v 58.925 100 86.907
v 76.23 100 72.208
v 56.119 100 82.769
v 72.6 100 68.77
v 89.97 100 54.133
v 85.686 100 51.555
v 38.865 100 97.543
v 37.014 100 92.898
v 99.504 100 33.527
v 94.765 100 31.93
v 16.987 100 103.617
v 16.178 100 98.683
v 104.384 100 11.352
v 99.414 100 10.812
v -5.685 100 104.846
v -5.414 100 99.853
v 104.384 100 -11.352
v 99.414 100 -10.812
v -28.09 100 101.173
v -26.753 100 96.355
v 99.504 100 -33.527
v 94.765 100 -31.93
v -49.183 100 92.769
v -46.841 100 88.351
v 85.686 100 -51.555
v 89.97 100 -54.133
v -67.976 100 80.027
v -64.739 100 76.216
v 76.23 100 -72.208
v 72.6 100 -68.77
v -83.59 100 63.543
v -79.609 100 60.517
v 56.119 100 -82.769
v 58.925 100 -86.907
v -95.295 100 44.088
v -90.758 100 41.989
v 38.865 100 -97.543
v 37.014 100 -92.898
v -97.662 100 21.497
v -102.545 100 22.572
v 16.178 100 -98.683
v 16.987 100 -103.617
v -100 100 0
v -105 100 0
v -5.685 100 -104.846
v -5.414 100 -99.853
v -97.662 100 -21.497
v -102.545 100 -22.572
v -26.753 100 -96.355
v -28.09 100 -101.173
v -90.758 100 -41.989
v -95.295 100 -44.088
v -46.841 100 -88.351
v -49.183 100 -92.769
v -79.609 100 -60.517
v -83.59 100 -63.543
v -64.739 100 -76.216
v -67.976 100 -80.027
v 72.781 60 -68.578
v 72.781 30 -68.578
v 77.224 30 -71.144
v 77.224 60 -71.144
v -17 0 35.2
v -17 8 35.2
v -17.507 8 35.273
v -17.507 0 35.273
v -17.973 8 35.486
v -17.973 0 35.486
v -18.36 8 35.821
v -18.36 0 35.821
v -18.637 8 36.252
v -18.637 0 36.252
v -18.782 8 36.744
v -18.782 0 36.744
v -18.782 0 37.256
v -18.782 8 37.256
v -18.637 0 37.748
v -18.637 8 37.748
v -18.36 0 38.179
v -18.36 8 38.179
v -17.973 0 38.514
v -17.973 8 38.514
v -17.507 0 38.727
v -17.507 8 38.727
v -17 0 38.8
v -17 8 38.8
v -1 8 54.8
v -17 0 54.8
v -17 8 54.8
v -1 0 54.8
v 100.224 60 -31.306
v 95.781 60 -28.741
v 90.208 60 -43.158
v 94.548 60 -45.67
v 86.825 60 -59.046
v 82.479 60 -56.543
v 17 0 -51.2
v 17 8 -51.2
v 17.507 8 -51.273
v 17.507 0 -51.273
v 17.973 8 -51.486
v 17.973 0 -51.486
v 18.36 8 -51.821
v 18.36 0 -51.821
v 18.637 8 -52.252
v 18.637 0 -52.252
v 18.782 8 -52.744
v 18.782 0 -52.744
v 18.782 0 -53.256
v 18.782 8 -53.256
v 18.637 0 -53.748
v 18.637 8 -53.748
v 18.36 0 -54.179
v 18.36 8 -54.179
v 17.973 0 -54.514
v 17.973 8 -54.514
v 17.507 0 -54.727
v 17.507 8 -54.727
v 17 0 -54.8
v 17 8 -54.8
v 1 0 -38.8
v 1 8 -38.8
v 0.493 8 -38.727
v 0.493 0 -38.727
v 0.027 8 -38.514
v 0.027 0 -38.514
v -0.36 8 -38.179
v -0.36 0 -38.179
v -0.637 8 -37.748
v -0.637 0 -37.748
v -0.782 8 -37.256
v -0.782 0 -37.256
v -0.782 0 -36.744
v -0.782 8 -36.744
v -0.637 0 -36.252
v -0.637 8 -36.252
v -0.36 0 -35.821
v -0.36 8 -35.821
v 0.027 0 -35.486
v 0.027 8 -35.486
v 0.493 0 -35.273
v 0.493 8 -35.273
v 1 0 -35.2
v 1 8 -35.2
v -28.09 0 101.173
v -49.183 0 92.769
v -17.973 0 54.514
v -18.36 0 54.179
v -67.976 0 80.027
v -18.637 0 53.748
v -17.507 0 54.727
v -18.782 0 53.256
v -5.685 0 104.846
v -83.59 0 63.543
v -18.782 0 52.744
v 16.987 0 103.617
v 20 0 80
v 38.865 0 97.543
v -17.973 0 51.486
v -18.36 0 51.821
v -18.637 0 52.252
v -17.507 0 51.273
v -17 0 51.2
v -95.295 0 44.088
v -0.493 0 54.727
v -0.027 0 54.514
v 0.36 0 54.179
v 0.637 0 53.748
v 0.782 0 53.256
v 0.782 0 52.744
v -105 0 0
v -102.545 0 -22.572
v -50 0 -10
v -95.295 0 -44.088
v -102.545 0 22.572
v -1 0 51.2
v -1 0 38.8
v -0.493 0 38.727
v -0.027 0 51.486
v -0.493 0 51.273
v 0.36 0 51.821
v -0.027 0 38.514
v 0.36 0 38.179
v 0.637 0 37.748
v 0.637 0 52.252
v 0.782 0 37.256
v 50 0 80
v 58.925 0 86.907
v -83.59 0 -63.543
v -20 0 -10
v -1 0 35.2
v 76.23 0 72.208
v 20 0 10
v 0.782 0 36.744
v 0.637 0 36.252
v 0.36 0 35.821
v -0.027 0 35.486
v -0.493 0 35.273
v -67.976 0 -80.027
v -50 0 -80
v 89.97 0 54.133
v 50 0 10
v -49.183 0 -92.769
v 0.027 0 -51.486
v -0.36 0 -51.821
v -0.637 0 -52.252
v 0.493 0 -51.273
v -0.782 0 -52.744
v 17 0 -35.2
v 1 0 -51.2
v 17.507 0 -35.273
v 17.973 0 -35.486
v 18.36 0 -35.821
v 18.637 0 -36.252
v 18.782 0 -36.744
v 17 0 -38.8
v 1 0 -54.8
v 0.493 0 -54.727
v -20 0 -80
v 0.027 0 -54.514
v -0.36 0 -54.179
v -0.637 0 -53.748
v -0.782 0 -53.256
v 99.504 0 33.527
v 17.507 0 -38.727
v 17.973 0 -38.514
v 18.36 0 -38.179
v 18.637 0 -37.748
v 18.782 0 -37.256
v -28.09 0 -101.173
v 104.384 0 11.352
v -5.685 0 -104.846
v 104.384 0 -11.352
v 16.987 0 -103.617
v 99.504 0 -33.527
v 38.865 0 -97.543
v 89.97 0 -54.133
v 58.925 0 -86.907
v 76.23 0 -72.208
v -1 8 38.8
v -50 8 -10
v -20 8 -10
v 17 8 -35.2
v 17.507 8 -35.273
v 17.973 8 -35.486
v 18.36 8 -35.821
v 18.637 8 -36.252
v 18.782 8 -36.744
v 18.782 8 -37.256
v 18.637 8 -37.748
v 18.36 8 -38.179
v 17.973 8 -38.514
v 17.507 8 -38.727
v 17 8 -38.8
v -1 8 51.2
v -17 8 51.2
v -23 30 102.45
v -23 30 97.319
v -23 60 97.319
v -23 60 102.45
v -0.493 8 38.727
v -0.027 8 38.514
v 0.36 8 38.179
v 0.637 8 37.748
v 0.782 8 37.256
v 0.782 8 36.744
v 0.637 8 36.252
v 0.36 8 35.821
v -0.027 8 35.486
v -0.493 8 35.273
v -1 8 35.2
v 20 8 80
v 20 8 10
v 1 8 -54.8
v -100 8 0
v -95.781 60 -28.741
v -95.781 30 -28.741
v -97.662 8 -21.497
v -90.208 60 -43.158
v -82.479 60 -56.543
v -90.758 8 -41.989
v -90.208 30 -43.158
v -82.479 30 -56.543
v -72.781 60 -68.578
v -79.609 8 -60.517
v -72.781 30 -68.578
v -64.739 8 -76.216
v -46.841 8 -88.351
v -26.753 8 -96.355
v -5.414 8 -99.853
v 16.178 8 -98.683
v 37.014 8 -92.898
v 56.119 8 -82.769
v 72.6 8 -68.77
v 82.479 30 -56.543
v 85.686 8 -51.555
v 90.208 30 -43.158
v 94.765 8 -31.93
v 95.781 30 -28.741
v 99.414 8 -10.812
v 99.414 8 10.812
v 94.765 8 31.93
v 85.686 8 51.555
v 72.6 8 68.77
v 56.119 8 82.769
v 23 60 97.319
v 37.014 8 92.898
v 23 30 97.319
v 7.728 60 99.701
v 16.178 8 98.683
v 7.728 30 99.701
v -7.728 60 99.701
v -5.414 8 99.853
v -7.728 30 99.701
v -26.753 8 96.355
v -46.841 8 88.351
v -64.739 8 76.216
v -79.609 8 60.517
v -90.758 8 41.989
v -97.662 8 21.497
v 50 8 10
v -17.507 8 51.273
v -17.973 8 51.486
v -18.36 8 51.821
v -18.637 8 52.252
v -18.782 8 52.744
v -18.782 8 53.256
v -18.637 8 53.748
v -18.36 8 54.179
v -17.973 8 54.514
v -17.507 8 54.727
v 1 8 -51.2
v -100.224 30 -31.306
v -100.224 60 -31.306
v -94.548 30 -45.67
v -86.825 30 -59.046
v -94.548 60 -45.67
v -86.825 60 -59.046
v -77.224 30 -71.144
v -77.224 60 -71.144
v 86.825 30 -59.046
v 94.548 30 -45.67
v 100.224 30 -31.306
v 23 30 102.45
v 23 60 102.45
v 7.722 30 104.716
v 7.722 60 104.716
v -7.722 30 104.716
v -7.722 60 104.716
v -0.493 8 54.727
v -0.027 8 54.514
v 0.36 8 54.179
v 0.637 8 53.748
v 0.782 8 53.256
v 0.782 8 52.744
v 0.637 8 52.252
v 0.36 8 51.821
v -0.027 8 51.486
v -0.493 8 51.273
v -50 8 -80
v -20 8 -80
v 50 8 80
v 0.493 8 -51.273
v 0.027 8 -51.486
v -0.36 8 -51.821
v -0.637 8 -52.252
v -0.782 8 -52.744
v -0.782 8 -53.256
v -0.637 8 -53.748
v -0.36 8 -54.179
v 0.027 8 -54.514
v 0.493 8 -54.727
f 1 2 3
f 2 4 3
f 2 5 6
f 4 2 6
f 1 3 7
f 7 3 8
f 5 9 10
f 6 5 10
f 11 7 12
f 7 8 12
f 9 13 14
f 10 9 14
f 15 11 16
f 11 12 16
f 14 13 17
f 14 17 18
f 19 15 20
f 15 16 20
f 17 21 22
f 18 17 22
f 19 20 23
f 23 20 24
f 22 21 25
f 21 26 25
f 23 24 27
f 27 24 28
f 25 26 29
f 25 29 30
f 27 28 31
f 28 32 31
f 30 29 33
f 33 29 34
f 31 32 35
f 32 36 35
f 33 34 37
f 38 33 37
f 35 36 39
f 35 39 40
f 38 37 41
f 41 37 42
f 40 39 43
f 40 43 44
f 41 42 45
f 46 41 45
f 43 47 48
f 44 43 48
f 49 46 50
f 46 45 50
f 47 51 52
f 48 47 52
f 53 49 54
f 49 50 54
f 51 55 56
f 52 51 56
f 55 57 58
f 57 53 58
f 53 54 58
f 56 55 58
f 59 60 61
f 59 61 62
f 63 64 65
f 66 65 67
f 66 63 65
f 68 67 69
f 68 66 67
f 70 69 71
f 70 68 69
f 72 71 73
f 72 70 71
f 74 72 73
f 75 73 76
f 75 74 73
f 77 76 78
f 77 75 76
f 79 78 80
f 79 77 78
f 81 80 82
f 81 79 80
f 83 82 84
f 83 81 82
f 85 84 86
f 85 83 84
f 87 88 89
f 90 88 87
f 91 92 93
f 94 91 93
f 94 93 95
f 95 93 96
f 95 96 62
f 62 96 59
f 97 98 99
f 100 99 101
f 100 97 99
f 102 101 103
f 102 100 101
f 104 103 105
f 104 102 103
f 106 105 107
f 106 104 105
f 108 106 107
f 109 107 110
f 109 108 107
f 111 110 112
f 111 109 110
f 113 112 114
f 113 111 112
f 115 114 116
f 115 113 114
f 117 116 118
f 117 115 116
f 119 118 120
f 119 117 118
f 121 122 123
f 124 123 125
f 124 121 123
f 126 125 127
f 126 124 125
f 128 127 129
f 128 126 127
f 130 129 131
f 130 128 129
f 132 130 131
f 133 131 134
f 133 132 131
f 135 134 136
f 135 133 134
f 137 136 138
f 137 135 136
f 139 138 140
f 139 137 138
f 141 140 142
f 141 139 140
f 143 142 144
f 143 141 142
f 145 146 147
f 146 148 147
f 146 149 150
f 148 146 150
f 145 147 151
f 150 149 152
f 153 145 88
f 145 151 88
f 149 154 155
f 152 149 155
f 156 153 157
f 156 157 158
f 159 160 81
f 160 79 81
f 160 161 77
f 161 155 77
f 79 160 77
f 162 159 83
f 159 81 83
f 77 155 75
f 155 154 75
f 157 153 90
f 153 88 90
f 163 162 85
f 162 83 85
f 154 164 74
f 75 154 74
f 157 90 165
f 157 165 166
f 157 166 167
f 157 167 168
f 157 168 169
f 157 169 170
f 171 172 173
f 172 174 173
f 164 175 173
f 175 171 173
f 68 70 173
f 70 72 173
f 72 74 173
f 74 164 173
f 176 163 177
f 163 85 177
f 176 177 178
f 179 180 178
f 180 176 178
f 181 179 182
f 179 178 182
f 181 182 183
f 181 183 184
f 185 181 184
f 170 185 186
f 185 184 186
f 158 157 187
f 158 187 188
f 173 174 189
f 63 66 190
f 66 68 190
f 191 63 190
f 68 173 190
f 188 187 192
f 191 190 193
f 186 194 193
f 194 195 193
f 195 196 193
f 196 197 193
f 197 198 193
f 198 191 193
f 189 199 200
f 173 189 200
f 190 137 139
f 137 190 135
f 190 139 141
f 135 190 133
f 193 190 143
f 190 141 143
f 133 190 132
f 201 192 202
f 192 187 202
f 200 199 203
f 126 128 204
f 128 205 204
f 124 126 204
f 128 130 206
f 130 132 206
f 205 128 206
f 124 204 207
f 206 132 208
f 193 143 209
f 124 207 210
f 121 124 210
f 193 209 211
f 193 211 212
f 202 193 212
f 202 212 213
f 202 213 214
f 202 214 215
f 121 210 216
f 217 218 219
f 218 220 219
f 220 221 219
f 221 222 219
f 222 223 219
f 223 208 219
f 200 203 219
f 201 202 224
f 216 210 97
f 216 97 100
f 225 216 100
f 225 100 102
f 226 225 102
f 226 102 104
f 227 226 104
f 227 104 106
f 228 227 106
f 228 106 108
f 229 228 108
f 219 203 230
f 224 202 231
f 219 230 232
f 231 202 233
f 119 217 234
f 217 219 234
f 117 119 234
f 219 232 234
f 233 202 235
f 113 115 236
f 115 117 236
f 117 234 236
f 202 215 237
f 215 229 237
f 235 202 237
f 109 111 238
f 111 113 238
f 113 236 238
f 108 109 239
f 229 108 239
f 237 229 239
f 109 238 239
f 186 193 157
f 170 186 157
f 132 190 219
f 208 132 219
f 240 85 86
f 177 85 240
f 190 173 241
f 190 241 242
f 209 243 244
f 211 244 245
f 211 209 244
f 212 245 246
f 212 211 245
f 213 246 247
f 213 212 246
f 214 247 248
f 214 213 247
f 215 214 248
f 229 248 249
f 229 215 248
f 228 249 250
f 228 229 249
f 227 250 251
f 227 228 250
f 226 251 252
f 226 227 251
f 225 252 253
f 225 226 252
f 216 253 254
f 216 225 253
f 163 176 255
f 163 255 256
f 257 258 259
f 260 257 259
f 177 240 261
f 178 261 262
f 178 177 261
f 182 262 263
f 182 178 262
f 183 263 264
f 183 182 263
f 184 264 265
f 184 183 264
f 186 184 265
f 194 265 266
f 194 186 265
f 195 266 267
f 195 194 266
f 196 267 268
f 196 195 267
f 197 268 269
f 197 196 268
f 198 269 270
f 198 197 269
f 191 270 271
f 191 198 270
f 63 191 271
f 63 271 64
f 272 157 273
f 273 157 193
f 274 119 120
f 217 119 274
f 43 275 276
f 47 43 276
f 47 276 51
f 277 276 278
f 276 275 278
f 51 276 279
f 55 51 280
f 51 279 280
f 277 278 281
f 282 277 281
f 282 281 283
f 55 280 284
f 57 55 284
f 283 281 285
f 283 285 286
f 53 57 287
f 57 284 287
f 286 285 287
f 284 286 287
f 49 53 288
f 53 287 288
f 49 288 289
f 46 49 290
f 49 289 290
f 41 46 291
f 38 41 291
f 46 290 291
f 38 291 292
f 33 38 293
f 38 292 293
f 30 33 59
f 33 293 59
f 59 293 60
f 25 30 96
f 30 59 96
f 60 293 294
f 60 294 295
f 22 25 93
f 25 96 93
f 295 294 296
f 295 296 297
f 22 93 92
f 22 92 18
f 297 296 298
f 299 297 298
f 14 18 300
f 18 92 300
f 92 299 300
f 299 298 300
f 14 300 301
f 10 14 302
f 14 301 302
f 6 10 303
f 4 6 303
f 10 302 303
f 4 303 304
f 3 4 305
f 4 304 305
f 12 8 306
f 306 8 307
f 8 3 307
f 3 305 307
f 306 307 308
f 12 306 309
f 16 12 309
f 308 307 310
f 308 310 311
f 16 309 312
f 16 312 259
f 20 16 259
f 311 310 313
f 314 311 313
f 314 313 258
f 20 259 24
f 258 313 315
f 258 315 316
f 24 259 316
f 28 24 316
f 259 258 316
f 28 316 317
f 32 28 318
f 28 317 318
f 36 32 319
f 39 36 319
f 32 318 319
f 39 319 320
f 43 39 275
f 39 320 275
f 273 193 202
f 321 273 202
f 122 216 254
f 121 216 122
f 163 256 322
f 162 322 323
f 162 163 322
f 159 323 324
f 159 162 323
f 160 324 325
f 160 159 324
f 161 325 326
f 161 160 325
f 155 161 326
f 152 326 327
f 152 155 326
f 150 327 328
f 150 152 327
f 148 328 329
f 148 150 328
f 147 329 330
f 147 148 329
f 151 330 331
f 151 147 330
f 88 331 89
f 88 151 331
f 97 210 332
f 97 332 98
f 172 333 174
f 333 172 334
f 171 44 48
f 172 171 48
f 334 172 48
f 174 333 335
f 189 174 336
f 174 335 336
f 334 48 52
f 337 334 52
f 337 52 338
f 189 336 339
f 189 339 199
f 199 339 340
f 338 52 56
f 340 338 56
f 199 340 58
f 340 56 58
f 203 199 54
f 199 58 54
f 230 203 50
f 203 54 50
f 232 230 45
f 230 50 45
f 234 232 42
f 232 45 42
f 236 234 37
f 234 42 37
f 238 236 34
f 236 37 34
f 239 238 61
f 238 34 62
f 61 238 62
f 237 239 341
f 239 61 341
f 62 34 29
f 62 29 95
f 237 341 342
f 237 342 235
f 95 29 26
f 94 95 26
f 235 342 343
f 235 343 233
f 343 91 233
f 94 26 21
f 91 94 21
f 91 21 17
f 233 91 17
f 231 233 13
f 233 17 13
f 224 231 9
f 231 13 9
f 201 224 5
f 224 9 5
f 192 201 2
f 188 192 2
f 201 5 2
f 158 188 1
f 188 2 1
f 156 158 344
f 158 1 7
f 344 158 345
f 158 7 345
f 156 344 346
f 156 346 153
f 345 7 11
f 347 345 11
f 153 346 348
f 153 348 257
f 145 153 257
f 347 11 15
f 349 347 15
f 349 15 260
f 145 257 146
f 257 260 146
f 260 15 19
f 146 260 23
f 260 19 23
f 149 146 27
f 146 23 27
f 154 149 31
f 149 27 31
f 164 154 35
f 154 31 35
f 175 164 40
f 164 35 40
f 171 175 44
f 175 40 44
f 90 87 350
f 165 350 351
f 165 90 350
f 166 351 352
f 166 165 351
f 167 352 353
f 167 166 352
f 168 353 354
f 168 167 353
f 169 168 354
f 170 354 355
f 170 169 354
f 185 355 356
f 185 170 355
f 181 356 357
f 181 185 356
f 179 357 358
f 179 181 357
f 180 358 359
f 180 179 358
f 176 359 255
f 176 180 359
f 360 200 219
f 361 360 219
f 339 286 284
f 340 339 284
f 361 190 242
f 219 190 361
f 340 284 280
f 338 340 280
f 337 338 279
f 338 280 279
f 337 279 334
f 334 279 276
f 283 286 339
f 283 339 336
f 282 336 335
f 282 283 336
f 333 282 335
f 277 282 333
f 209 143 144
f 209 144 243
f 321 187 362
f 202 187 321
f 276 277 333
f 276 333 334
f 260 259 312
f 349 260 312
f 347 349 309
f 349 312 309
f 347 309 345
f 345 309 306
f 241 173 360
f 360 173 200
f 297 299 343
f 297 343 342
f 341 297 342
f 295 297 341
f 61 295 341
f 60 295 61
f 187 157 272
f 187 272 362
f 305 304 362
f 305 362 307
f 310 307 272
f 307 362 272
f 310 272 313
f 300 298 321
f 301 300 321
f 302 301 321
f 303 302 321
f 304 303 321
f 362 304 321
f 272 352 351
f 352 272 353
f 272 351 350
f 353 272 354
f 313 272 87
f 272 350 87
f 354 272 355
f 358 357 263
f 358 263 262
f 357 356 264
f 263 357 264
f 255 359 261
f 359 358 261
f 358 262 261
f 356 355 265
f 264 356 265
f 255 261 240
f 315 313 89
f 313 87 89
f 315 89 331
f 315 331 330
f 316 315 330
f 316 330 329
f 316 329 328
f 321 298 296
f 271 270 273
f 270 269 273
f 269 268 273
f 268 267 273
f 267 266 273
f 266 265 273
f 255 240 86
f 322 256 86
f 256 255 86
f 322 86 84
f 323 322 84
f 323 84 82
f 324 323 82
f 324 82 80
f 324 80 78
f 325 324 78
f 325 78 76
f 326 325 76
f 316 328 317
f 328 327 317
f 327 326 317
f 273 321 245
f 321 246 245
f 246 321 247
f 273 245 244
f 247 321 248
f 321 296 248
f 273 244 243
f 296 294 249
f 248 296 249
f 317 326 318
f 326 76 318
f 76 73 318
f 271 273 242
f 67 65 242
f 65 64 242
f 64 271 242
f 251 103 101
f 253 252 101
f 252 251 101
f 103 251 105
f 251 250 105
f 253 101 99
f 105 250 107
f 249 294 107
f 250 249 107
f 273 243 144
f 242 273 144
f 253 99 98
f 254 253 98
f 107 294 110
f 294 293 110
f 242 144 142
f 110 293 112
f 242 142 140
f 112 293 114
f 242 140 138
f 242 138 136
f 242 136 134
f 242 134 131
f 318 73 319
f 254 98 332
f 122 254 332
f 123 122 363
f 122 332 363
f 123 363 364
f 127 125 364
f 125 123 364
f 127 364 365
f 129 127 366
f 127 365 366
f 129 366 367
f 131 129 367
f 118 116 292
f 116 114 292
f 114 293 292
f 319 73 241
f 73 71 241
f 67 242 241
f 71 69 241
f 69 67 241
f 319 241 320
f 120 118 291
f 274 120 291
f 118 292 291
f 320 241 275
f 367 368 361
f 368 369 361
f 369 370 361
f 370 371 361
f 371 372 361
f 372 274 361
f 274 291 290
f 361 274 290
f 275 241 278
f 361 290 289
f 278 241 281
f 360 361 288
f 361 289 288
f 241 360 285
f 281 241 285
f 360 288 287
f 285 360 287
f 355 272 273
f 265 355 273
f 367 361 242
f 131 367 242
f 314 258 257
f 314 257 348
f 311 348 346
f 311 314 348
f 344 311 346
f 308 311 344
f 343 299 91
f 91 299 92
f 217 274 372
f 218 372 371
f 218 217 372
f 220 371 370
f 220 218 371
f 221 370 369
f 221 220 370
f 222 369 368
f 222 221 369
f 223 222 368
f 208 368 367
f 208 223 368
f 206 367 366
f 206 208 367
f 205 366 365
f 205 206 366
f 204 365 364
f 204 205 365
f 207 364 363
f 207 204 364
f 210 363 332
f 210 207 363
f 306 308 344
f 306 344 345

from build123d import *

# Parameters (mm, degrees)
SKETCH_2_W               = 46
SKETCH_2_H               = 30
CUT_EXTRUDE_1_DEPTH      = 180.0251379
PATTERN_CIRCULAR_1_COUNT = 3
SKETCH_3_W               = 30
SKETCH_3_H               = 70
CUT_EXTRUDE_2_DEPTH      = 180.0251379


with BuildPart() as part:
    # 草图1 → 旋转1 (revolve)
    with BuildSketch(Plane.XY):
        Polygon((-105, 100), (-100, 100), (-100, 8), (0, 8), (0, 0), (-105, 0), align=None)
    revolve(axis=Axis((0, 100, 0), (0, -1, 0)))

    # 草图2 → 切除-拉伸1 (cut, through all)
    with BuildSketch(Plane.XY):
        with Locations((0, 45)):
            Rectangle(SKETCH_2_W, SKETCH_2_H)
    cut_extrude_1 = extrude(amount=CUT_EXTRUDE_1_DEPTH, mode=Mode.SUBTRACT)

    # 阵列(圆周)1: 切除-拉伸1 ×3 about axis
    pattern_circular_1_axis = Axis((0, 0, 0), (0, 1, 0))
    for i in range(1, PATTERN_CIRCULAR_1_COUNT):
        add(cut_extrude_1.rotate(pattern_circular_1_axis, i * 360 / PATTERN_CIRCULAR_1_COUNT), mode=Mode.SUBTRACT)

    # 草图3 → 切除-拉伸2 (cut, through all)
    with BuildSketch(Plane(origin=(0, 0, 0), x_dir=(1, 0, 0), z_dir=(0, 1, 0))):
        with Locations((35, -45)):
            Rectangle(SKETCH_3_W, SKETCH_3_H)
        with BuildLine():
            Line((-17, -54.8), (-1, -54.8))
            ThreePointArc((-1, -54.8), (0.8, -53), (-1, -51.2))
            Line((-1, -51.2), (-17, -51.2))
            ThreePointArc((-17, -51.2), (-18.8, -53), (-17, -54.8))
        make_face()
        with BuildLine():
            Line((-17, -38.8), (-1, -38.8))
            ThreePointArc((-1, -38.8), (0.8, -37), (-1, -35.2))
            Line((-1, -35.2), (-17, -35.2))
            ThreePointArc((-17, -35.2), (-18.8, -37), (-17, -38.8))
        make_face()
        with BuildLine():
            Line((17, 38.8), (1, 38.8))
            ThreePointArc((1, 38.8), (-0.8, 37), (1, 35.2))
            Line((1, 35.2), (17, 35.2))
            ThreePointArc((17, 35.2), (18.8, 37), (17, 38.8))
        make_face()
        with BuildLine():
            Line((17, 54.8), (1, 54.8))
            ThreePointArc((1, 54.8), (-0.8, 53), (1, 51.2))
            Line((1, 51.2), (17, 51.2))
            ThreePointArc((17, 51.2), (18.8, 53), (17, 54.8))
        make_face()
        with Locations((-35, 45)):
            Rectangle(SKETCH_3_W, SKETCH_3_H)
    extrude(amount=CUT_EXTRUDE_2_DEPTH, mode=Mode.SUBTRACT)


solid = part.part
